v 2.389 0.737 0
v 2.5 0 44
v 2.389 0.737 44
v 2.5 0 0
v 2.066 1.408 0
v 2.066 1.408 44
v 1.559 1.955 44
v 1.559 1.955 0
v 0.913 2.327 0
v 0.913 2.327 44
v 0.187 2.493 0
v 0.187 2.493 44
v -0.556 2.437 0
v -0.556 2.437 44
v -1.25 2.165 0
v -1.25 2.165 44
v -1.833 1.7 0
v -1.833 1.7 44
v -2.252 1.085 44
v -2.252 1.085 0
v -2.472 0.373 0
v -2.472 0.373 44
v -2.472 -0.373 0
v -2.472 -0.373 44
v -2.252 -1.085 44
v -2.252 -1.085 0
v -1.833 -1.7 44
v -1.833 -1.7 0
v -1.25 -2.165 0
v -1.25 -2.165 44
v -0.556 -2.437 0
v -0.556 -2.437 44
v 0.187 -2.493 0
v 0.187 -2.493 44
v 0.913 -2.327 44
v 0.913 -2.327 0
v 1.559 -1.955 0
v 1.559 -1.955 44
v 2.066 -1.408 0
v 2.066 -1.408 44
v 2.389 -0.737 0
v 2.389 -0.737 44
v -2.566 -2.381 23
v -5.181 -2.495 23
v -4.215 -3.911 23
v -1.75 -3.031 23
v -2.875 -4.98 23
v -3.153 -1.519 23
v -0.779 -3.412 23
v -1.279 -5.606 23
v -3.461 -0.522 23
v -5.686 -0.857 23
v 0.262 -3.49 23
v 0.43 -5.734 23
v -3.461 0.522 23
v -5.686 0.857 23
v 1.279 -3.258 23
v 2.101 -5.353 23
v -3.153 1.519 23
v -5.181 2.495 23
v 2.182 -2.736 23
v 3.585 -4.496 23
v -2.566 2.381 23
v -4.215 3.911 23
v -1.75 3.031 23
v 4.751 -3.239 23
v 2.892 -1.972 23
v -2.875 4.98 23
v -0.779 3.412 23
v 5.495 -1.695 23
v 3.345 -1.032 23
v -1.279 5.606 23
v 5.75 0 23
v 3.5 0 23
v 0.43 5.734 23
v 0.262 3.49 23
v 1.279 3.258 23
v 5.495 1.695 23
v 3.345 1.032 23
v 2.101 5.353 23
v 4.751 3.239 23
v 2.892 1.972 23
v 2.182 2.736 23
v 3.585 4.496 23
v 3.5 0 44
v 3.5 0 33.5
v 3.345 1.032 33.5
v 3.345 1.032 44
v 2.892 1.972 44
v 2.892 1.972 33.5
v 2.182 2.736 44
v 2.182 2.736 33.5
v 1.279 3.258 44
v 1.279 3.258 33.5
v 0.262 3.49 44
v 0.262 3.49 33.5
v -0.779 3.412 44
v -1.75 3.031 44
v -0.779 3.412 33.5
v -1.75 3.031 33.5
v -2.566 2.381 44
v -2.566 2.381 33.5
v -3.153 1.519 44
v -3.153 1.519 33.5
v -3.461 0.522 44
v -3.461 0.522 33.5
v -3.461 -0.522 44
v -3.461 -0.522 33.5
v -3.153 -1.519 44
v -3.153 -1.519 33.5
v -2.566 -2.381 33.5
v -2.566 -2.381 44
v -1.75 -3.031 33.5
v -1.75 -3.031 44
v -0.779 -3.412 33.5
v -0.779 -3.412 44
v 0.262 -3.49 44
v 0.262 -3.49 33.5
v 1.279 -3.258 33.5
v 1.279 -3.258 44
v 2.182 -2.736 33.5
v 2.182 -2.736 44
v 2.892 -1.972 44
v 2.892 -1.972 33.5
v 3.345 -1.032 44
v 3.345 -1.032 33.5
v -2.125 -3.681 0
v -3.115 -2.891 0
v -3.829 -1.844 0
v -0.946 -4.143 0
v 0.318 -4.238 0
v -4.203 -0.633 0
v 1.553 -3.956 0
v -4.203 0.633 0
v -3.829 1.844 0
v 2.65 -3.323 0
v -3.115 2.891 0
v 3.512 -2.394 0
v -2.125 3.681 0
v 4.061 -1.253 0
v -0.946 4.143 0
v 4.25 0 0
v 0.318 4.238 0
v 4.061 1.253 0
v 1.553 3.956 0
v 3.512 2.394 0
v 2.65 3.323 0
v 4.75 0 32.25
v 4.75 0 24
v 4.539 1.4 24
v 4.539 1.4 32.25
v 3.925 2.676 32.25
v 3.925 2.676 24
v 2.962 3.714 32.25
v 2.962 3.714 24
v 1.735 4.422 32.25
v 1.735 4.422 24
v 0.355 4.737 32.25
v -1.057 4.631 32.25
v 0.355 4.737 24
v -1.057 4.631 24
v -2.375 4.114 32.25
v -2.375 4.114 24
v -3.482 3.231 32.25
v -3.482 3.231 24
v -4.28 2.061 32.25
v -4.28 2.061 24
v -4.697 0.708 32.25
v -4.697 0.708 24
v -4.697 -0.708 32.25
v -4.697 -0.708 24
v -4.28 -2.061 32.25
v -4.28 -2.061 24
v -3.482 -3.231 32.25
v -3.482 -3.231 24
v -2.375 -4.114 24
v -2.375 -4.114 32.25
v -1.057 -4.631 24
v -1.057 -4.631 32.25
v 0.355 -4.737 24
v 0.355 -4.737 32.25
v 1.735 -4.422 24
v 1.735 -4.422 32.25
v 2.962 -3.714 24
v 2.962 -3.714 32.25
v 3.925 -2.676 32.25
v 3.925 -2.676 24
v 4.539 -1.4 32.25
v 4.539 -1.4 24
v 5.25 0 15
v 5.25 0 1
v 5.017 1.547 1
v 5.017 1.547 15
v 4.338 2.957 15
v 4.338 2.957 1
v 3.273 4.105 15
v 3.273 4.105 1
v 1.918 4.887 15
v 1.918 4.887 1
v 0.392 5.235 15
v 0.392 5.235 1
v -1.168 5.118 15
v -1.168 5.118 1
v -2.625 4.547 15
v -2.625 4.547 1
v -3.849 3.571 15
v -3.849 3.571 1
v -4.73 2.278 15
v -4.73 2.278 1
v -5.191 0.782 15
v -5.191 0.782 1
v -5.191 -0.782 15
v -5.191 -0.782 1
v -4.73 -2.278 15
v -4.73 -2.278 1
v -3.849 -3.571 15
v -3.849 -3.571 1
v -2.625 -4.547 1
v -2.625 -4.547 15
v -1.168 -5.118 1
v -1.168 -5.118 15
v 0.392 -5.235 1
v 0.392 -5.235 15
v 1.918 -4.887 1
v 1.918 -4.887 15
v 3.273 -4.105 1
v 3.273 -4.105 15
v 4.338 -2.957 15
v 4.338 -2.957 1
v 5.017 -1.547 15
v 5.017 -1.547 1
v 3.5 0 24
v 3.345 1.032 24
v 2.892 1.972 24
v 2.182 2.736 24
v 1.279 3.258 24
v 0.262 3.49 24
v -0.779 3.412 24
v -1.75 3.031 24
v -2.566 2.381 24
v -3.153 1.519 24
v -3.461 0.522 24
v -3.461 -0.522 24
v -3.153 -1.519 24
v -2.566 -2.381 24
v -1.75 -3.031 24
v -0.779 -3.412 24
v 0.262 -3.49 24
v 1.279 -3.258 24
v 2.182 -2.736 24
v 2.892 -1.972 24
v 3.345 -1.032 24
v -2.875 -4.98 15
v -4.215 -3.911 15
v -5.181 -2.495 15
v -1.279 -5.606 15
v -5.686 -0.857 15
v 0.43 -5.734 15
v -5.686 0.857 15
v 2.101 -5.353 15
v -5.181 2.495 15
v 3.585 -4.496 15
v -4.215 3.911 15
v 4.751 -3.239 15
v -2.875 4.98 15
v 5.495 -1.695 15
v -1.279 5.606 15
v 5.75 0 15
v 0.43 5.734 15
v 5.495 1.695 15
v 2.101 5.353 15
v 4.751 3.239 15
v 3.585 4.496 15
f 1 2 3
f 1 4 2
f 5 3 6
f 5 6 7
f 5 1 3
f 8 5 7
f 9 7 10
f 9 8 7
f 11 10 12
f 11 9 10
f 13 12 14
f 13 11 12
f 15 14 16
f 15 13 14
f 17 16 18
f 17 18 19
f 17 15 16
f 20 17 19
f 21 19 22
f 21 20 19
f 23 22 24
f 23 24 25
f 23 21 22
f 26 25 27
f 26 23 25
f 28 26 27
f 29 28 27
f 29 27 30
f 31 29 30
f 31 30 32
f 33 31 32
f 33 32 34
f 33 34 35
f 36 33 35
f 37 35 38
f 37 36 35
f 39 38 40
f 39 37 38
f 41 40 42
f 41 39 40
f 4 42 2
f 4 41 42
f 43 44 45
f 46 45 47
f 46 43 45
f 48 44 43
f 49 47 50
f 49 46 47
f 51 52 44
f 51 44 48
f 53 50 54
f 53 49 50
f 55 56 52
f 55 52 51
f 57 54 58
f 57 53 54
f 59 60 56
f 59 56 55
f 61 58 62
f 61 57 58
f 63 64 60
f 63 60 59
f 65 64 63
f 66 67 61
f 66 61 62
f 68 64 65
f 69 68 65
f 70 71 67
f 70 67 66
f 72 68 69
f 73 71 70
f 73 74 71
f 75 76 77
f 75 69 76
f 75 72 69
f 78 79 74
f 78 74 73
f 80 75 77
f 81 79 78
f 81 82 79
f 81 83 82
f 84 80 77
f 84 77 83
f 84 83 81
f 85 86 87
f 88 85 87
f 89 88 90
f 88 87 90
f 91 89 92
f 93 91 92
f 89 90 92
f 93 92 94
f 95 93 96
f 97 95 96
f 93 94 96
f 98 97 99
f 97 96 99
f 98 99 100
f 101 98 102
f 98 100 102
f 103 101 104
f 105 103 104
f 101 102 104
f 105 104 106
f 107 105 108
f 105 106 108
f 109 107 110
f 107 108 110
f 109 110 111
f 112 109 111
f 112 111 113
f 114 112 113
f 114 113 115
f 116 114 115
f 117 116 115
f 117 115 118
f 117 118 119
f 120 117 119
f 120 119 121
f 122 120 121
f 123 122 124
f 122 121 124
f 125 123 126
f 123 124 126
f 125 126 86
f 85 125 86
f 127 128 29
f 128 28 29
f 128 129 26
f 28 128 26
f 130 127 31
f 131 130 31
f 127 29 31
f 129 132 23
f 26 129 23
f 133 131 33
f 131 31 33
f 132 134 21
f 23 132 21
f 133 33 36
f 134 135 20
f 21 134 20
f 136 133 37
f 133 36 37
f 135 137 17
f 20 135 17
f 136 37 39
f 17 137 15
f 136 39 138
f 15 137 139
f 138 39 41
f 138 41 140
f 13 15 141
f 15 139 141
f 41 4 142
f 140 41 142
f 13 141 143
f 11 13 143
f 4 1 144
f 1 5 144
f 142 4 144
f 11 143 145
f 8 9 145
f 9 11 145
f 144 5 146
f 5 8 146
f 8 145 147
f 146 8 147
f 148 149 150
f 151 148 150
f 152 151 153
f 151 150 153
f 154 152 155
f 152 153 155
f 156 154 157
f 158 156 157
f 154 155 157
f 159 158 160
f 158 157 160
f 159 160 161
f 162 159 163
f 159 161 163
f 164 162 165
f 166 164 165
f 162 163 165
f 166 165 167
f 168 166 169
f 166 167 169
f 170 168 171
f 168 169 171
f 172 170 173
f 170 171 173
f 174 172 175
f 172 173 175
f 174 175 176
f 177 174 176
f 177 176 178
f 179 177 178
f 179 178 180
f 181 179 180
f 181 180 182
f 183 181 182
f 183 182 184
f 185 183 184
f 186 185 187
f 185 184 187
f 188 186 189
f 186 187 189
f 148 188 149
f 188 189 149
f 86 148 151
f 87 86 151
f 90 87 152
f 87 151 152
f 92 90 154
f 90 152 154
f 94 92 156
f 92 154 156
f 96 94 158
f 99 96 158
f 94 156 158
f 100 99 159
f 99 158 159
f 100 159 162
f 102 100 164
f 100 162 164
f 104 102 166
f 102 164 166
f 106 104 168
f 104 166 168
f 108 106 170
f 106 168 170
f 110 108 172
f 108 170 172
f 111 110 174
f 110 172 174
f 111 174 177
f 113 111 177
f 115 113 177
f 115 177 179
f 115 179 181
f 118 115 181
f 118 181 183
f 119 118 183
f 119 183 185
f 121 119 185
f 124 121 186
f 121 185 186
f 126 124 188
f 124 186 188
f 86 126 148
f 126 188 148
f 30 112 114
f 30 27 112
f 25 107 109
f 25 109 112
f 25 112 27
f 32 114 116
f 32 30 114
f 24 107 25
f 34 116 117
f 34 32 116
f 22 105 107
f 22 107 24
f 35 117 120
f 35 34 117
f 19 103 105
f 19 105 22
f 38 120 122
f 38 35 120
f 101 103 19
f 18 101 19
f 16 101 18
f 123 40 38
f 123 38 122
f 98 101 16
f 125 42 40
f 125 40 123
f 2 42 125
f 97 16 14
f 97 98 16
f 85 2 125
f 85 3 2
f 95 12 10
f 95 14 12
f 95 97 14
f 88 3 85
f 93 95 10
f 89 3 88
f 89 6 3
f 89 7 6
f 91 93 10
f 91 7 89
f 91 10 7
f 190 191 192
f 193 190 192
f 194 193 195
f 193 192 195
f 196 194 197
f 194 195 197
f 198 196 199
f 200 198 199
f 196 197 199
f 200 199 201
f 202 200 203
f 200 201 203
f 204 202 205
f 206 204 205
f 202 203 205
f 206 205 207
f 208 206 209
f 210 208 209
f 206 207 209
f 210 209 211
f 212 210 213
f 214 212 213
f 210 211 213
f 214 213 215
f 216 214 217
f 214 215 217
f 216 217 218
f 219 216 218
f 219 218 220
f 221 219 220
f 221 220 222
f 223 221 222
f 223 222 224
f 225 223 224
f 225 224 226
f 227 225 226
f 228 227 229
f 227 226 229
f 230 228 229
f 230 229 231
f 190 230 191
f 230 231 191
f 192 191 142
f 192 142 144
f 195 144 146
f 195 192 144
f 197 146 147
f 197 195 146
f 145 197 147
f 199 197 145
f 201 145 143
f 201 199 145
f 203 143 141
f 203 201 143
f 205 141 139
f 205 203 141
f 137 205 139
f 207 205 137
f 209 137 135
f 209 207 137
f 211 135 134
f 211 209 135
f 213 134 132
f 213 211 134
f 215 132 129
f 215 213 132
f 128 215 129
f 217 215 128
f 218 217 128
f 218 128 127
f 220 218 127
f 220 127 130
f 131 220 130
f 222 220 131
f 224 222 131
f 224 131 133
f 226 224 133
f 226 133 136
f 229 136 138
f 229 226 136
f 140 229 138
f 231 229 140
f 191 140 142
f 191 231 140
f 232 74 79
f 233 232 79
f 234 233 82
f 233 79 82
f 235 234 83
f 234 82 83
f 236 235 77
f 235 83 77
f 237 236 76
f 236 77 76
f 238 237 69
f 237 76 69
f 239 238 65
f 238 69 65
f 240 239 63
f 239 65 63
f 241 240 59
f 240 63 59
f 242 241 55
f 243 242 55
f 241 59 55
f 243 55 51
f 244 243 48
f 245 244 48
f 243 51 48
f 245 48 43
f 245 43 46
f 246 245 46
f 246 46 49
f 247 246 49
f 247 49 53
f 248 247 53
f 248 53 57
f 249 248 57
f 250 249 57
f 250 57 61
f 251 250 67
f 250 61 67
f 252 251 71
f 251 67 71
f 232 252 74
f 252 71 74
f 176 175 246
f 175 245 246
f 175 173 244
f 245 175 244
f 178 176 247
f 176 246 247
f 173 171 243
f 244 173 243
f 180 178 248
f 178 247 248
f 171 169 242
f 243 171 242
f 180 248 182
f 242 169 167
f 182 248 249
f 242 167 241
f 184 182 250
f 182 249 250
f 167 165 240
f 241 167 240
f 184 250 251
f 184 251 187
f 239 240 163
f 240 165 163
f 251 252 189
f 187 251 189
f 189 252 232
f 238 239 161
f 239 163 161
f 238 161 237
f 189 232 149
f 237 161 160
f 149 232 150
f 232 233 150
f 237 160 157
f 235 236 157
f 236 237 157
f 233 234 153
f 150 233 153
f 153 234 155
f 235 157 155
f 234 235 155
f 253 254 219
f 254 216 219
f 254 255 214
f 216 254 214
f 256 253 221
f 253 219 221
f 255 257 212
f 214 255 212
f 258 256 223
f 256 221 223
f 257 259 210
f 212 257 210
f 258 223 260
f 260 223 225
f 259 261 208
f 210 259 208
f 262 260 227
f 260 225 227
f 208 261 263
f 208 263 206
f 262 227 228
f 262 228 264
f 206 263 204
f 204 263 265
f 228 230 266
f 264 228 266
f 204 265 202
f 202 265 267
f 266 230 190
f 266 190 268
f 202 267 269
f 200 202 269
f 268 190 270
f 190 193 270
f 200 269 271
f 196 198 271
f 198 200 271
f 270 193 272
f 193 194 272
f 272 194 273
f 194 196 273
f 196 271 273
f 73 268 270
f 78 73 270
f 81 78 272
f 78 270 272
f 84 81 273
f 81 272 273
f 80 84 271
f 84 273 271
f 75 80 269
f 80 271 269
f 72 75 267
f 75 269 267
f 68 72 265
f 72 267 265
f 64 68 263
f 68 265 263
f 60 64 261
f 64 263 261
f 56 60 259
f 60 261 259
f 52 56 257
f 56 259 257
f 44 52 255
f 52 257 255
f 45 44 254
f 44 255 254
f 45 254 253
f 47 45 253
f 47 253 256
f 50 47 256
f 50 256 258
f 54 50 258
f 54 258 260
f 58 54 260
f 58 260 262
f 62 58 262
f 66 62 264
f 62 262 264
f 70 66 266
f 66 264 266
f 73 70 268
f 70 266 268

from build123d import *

# Parameters (mm, degrees)
ESQUISSE1_R        = 5.25
ESQUISSE1_R_2      = 2.5
BOSS_EXTRU_1_DEPTH = 15
ESQUISSE2_R        = 5.75
ESQUISSE2_R_2      = 2.5
BOSS_EXTRU_2_DEPTH = 8
ESQUISSE3_R        = 3.5
ESQUISSE3_R_2      = 2.5
BOSS_EXTRU_3_DEPTH = 1
ESQUISSE4_R        = 4.75
ESQUISSE4_R_2      = 2.5
BOSS_EXTRU_4_DEPTH = 8.25
ESQUISSE5_R        = 3.5
ESQUISSE5_R_2      = 2.5
BOSS_EXTRU_5_DEPTH = 11.75
CHANFREIN1_SIZE    = 1.25
CHANFREIN2_SIZE    = 1


with BuildPart() as part:
    # Esquisse1 → Boss.-Extru.1 (new body)
    with BuildSketch(Plane.XY):
        Circle(ESQUISSE1_R)
        Circle(ESQUISSE1_R_2, mode=Mode.SUBTRACT)
    extrude(amount=BOSS_EXTRU_1_DEPTH)

    # Esquisse2 → Boss.-Extru.2 (add)
    with BuildSketch(Plane.XY.offset(15)):
        Circle(ESQUISSE2_R)
        Circle(ESQUISSE2_R_2, mode=Mode.SUBTRACT)
    extrude(amount=BOSS_EXTRU_2_DEPTH)

    # Esquisse3 → Boss.-Extru.3 (add)
    with BuildSketch(Plane.XY.offset(23)):
        Circle(ESQUISSE3_R)
        Circle(ESQUISSE3_R_2, mode=Mode.SUBTRACT)
    extrude(amount=BOSS_EXTRU_3_DEPTH)

    # Esquisse4 → Boss.-Extru.4 (add)
    with BuildSketch(Plane.XY.offset(24)):
        Circle(ESQUISSE4_R)
        Circle(ESQUISSE4_R_2, mode=Mode.SUBTRACT)
    extrude(amount=BOSS_EXTRU_4_DEPTH)

    # Esquisse5 → Boss.-Extru.5 (add)
    with BuildSketch(Plane.XY.offset(32.25)):
        Circle(ESQUISSE5_R)
        Circle(ESQUISSE5_R_2, mode=Mode.SUBTRACT)
    extrude(amount=BOSS_EXTRU_5_DEPTH)

    # Chanfrein1
    chanfrein1_edges = [part.edges().sort_by_distance(p)[0] for p in [
        (-3.5, 0, 32.25),
    ]]
    chamfer(chanfrein1_edges, length=CHANFREIN1_SIZE - 0.0001)  # a hair under: the kernel refuses the full size

    # Chanfrein2
    chanfrein2_edges = [part.edges().sort_by_distance(p)[0] for p in [
        (-5.25, 0, 0),
    ]]
    chamfer(chanfrein2_edges, length=CHANFREIN2_SIZE)


solid = part.part
